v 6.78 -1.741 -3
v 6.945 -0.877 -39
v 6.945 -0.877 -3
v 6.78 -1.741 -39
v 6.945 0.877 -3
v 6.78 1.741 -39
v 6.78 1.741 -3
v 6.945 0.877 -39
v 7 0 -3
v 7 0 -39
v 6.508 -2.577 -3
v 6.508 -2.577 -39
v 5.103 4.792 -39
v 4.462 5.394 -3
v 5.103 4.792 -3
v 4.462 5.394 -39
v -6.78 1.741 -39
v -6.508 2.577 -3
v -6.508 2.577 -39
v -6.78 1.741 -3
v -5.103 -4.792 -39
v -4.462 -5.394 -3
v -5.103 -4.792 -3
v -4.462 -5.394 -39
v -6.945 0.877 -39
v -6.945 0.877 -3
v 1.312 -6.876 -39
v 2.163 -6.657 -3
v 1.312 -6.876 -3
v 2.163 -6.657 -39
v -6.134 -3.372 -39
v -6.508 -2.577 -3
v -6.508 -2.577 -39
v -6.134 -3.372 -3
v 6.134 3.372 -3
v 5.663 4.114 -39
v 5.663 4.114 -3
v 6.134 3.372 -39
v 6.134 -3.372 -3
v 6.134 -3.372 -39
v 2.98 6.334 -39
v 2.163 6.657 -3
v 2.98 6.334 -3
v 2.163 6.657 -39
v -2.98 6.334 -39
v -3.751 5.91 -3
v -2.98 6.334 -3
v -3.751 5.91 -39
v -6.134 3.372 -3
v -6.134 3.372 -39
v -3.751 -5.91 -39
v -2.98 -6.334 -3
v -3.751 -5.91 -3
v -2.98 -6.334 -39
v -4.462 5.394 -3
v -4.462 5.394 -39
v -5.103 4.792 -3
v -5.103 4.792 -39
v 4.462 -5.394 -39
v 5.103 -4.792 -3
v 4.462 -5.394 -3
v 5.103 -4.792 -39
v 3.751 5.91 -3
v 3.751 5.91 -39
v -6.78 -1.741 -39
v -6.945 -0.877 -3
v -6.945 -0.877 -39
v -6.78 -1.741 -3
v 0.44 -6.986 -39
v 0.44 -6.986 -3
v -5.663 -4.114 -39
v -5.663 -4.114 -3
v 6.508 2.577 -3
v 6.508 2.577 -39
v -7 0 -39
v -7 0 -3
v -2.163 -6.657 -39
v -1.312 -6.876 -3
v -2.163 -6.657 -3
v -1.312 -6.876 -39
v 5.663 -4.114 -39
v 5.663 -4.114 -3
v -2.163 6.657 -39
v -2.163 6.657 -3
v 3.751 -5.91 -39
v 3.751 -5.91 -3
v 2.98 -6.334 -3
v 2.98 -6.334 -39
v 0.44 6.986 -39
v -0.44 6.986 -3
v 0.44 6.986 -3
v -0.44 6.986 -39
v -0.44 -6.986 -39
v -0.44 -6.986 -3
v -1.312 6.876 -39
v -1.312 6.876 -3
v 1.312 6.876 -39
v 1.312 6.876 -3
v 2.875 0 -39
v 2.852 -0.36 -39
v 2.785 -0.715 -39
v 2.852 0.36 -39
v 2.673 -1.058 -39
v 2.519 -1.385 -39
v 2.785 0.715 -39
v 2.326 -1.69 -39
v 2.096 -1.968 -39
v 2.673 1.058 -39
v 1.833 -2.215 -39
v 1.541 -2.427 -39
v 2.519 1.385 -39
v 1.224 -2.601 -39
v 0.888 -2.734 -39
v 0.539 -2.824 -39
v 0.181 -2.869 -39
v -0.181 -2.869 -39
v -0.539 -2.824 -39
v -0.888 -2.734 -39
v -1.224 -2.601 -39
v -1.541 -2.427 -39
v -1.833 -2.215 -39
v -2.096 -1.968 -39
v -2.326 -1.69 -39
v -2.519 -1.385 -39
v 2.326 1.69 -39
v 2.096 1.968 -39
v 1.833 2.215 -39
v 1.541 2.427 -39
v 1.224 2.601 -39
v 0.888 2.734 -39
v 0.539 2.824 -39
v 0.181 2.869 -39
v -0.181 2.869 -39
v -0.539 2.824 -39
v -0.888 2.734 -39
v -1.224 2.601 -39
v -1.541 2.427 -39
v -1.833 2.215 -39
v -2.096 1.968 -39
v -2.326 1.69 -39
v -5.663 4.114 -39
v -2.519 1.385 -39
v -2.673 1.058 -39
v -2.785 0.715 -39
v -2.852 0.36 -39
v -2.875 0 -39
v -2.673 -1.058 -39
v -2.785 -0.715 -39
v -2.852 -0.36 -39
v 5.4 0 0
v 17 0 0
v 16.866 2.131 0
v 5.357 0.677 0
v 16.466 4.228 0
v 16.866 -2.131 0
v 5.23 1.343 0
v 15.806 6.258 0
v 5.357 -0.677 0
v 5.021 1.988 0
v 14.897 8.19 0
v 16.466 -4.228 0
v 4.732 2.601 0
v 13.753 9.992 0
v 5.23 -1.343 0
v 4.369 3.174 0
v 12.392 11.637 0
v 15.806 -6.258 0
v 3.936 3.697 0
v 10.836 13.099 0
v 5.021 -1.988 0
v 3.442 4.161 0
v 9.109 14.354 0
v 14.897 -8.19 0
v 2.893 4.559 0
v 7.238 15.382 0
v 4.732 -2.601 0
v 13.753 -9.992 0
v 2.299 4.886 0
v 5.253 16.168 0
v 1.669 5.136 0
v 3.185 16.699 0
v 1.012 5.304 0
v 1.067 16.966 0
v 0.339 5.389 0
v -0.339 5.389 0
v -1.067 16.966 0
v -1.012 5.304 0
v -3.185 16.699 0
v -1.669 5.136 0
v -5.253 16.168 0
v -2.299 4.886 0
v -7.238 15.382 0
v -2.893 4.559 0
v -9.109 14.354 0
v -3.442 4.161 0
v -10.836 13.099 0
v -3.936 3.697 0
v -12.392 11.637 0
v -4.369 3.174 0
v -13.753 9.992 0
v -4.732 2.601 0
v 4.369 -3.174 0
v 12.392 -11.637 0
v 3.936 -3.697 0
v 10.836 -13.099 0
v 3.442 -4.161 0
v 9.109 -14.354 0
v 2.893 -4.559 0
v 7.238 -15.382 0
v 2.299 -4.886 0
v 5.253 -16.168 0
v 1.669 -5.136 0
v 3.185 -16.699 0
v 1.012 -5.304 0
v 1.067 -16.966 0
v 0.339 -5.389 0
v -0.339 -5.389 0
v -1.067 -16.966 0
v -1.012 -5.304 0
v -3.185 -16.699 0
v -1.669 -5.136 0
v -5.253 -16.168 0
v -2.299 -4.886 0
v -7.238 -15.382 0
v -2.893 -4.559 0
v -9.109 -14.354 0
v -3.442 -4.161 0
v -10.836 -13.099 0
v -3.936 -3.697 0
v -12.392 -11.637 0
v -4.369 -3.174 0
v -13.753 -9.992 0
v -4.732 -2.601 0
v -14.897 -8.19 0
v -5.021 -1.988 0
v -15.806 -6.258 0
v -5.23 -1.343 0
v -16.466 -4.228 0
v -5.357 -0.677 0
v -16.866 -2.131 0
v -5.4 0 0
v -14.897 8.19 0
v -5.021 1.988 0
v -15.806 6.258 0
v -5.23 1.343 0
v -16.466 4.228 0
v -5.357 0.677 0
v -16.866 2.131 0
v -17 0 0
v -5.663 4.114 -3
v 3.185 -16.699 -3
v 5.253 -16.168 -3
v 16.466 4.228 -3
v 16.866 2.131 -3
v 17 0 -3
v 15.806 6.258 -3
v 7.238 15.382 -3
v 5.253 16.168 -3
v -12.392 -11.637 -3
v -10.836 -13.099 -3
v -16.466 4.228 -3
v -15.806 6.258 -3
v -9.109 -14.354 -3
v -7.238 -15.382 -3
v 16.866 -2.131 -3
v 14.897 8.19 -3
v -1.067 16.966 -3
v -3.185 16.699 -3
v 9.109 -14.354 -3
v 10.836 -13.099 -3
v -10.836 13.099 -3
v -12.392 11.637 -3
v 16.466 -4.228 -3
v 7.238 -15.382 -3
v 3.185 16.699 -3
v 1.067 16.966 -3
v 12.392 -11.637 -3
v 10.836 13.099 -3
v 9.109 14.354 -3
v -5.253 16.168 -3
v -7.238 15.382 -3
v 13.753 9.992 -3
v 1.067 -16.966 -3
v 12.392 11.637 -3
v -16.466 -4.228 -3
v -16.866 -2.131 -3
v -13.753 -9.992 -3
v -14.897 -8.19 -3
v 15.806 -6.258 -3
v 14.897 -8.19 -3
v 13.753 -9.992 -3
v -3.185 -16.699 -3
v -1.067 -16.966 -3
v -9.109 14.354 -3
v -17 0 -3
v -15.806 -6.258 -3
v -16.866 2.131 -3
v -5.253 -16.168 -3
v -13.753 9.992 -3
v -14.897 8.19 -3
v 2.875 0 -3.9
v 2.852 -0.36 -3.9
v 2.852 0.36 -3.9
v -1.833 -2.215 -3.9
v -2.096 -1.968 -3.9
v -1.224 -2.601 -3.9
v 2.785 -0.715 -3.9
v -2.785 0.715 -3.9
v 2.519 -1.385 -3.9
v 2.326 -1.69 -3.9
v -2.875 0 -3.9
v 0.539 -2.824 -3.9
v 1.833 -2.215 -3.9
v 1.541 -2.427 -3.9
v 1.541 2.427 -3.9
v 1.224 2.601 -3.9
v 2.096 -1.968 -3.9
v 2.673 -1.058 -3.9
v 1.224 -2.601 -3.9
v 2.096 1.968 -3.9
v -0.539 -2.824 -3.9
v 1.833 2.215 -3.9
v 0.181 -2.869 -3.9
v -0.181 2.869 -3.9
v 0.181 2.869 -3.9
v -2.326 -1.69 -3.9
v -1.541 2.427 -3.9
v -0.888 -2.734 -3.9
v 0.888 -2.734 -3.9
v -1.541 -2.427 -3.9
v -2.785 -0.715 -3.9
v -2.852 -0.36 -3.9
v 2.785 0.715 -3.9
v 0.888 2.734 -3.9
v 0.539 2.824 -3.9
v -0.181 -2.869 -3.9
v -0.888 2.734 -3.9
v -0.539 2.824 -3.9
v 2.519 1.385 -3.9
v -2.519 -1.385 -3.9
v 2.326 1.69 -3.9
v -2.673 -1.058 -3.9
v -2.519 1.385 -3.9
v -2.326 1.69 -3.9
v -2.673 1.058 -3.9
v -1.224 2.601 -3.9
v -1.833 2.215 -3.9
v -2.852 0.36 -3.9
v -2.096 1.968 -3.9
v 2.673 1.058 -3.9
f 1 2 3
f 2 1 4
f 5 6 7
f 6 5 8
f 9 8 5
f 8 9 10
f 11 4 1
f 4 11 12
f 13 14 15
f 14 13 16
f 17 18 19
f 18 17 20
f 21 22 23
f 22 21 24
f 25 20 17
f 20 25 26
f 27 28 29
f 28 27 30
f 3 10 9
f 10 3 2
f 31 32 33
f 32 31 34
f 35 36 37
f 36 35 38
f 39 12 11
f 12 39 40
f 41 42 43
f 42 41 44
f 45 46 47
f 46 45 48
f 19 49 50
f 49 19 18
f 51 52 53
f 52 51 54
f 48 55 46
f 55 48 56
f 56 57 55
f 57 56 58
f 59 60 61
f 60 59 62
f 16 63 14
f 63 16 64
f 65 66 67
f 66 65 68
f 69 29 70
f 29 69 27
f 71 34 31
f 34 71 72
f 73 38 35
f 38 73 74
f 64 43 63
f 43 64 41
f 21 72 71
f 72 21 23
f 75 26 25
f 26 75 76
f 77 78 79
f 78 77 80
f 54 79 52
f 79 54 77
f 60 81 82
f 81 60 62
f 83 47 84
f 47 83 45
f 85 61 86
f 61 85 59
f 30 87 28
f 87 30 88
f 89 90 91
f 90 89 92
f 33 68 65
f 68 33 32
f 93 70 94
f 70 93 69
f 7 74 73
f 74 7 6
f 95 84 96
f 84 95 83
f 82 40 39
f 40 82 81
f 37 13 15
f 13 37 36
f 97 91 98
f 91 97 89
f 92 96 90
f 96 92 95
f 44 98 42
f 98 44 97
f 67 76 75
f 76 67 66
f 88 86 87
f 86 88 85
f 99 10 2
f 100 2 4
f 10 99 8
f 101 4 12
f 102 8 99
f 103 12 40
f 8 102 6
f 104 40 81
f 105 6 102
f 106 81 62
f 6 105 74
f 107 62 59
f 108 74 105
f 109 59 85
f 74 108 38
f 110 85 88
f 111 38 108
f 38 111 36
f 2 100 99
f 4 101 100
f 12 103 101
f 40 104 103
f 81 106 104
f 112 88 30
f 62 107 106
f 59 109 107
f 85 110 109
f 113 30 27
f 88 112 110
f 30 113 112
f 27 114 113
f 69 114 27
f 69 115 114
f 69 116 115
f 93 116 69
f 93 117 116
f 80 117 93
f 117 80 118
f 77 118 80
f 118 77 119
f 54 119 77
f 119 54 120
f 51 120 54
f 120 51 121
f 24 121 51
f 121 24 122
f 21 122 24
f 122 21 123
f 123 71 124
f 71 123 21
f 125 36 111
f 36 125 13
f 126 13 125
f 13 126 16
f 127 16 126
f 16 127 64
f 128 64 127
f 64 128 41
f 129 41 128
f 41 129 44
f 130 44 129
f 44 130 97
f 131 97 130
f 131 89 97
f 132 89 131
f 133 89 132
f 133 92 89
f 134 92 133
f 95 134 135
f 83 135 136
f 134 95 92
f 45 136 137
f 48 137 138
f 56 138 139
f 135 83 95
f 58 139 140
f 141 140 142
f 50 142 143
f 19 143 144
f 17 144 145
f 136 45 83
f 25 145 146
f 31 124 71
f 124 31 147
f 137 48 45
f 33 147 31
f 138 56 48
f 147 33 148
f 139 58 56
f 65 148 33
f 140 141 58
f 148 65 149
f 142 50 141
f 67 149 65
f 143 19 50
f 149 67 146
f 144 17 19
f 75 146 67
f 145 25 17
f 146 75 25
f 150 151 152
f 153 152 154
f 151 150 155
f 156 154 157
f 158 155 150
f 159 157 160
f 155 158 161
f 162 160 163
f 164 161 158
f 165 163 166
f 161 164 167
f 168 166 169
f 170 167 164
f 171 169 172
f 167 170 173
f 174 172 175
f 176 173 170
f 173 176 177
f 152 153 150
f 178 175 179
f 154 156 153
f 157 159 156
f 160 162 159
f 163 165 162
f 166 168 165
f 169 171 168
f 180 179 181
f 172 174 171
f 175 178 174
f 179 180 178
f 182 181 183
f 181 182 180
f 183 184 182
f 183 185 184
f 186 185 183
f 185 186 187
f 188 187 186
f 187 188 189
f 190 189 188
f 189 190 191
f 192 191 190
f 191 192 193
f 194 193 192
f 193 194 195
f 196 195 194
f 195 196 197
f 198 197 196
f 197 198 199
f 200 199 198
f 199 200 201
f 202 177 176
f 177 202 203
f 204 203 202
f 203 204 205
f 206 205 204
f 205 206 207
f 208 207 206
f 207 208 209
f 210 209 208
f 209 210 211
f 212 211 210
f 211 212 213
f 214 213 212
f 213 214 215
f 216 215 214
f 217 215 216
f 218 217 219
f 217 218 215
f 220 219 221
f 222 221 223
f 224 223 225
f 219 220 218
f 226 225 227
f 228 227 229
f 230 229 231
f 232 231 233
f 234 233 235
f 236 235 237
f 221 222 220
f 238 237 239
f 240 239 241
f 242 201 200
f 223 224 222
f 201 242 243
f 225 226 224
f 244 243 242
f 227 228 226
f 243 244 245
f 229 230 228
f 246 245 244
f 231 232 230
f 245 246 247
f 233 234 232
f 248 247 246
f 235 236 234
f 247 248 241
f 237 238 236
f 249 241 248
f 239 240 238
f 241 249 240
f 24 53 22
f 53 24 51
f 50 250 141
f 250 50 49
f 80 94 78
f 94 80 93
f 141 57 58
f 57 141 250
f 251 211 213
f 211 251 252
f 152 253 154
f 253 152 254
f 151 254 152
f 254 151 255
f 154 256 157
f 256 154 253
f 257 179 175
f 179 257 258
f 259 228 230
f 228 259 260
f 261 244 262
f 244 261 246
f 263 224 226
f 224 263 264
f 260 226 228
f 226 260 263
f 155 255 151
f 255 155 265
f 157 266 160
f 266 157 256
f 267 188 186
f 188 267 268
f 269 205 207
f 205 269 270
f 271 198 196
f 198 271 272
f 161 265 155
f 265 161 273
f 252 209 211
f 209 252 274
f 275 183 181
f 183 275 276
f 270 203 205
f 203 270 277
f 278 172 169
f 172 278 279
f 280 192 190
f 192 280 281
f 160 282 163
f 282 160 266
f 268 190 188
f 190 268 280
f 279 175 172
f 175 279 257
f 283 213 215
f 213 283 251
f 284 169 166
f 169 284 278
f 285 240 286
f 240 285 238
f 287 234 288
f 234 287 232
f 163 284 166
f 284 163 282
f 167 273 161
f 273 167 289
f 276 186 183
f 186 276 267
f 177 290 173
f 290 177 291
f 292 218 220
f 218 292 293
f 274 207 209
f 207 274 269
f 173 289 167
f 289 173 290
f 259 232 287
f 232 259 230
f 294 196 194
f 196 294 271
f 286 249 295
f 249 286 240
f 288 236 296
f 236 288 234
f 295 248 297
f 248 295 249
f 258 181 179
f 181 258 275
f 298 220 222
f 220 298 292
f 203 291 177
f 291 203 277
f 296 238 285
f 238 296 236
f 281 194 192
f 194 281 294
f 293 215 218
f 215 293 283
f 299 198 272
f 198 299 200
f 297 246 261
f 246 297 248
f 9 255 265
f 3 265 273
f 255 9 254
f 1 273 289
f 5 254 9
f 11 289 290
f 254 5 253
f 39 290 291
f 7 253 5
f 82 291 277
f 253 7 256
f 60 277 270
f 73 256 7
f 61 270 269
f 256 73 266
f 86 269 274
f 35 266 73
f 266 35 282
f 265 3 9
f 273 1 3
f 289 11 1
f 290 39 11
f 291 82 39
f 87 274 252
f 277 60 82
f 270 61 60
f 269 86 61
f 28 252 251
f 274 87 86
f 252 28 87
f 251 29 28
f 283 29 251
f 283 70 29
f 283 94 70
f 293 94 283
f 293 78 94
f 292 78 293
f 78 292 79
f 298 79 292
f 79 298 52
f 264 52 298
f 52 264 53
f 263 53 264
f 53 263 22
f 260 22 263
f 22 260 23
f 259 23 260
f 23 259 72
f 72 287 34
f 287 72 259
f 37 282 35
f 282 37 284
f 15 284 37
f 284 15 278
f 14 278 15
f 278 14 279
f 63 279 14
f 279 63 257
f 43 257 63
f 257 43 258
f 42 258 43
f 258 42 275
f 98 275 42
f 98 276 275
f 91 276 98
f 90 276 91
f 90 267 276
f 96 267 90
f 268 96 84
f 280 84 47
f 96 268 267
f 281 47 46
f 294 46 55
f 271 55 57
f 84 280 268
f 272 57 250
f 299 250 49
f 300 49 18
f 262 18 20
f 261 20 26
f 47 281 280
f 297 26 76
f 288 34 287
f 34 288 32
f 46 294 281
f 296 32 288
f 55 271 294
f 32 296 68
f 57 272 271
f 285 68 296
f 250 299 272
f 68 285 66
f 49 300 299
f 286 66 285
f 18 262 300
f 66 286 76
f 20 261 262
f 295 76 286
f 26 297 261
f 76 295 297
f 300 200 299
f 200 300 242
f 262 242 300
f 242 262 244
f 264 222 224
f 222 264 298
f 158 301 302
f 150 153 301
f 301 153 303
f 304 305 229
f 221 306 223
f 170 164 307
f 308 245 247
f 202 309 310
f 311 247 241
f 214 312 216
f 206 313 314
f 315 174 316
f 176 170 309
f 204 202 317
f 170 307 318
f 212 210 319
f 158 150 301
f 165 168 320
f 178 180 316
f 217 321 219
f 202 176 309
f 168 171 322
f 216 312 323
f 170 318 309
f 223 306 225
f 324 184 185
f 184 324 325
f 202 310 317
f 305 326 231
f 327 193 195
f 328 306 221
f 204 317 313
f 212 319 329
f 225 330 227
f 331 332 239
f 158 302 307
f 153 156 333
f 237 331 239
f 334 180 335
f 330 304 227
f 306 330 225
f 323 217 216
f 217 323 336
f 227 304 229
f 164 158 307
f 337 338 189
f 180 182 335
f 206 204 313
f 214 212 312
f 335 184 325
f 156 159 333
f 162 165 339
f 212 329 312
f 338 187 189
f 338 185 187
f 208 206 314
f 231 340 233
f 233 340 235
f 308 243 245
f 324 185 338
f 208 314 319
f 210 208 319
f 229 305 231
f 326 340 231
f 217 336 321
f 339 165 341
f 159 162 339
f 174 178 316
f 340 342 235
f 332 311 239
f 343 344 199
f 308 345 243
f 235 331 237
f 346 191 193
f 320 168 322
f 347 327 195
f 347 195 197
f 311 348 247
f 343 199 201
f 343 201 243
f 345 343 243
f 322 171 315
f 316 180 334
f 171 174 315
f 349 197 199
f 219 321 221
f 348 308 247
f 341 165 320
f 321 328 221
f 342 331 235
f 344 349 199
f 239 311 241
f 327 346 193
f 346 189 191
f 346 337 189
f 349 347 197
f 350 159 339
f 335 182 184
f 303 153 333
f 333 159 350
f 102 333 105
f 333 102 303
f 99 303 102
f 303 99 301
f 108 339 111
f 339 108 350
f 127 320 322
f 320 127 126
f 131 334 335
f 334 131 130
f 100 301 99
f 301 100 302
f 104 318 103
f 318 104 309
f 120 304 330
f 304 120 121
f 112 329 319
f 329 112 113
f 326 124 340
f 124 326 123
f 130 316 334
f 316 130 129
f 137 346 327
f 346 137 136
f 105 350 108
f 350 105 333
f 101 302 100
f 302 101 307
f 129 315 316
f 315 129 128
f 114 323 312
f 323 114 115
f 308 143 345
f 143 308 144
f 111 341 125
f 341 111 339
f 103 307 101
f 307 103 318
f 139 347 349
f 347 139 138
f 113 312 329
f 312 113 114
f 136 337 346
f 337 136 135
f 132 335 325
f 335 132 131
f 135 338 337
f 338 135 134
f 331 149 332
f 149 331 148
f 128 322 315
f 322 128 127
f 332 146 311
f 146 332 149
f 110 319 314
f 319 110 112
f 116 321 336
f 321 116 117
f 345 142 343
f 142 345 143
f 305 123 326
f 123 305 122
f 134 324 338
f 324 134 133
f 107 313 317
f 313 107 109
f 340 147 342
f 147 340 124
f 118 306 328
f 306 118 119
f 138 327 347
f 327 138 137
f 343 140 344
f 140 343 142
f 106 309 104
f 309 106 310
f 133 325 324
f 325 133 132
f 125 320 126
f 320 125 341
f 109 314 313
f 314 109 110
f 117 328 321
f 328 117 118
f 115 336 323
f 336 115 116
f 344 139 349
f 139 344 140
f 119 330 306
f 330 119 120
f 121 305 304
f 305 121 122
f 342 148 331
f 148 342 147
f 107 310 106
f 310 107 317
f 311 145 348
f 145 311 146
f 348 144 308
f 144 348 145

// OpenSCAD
$fn = 50;


difference() {
	union() {
		translate(v = [0, 0, -39.0000000000]) {
			cylinder(h = 39, r = 7.0000000000);
		}
		translate(v = [0, 0, -3.0000000000]) {
			cylinder(h = 3, r = 17.0000000000);
		}
	}
	union() {
		translate(v = [0, 0, 0]) {
			rotate(a = [0, 0, 0]) {
				difference() {
					union() {
						#translate(v = [0, 0, -39.0000000000]) {
							cylinder(h = 39, r = 2.6000000000);
						}
						#translate(v = [0, 0, -3.9000000000]) {
							cylinder(h = 3.9000000000, r1 = 2.8750000000, r2 = 5.4000000000);
						}
						#translate(v = [0, 0, -39.0000000000]) {
							cylinder(h = 39, r = 2.8750000000);
						}
						#translate(v = [0, 0, -39.0000000000]) {
							cylinder(h = 39, r = 2.6000000000);
						}
					}
					union();
				}
			}
		}
	}
}
